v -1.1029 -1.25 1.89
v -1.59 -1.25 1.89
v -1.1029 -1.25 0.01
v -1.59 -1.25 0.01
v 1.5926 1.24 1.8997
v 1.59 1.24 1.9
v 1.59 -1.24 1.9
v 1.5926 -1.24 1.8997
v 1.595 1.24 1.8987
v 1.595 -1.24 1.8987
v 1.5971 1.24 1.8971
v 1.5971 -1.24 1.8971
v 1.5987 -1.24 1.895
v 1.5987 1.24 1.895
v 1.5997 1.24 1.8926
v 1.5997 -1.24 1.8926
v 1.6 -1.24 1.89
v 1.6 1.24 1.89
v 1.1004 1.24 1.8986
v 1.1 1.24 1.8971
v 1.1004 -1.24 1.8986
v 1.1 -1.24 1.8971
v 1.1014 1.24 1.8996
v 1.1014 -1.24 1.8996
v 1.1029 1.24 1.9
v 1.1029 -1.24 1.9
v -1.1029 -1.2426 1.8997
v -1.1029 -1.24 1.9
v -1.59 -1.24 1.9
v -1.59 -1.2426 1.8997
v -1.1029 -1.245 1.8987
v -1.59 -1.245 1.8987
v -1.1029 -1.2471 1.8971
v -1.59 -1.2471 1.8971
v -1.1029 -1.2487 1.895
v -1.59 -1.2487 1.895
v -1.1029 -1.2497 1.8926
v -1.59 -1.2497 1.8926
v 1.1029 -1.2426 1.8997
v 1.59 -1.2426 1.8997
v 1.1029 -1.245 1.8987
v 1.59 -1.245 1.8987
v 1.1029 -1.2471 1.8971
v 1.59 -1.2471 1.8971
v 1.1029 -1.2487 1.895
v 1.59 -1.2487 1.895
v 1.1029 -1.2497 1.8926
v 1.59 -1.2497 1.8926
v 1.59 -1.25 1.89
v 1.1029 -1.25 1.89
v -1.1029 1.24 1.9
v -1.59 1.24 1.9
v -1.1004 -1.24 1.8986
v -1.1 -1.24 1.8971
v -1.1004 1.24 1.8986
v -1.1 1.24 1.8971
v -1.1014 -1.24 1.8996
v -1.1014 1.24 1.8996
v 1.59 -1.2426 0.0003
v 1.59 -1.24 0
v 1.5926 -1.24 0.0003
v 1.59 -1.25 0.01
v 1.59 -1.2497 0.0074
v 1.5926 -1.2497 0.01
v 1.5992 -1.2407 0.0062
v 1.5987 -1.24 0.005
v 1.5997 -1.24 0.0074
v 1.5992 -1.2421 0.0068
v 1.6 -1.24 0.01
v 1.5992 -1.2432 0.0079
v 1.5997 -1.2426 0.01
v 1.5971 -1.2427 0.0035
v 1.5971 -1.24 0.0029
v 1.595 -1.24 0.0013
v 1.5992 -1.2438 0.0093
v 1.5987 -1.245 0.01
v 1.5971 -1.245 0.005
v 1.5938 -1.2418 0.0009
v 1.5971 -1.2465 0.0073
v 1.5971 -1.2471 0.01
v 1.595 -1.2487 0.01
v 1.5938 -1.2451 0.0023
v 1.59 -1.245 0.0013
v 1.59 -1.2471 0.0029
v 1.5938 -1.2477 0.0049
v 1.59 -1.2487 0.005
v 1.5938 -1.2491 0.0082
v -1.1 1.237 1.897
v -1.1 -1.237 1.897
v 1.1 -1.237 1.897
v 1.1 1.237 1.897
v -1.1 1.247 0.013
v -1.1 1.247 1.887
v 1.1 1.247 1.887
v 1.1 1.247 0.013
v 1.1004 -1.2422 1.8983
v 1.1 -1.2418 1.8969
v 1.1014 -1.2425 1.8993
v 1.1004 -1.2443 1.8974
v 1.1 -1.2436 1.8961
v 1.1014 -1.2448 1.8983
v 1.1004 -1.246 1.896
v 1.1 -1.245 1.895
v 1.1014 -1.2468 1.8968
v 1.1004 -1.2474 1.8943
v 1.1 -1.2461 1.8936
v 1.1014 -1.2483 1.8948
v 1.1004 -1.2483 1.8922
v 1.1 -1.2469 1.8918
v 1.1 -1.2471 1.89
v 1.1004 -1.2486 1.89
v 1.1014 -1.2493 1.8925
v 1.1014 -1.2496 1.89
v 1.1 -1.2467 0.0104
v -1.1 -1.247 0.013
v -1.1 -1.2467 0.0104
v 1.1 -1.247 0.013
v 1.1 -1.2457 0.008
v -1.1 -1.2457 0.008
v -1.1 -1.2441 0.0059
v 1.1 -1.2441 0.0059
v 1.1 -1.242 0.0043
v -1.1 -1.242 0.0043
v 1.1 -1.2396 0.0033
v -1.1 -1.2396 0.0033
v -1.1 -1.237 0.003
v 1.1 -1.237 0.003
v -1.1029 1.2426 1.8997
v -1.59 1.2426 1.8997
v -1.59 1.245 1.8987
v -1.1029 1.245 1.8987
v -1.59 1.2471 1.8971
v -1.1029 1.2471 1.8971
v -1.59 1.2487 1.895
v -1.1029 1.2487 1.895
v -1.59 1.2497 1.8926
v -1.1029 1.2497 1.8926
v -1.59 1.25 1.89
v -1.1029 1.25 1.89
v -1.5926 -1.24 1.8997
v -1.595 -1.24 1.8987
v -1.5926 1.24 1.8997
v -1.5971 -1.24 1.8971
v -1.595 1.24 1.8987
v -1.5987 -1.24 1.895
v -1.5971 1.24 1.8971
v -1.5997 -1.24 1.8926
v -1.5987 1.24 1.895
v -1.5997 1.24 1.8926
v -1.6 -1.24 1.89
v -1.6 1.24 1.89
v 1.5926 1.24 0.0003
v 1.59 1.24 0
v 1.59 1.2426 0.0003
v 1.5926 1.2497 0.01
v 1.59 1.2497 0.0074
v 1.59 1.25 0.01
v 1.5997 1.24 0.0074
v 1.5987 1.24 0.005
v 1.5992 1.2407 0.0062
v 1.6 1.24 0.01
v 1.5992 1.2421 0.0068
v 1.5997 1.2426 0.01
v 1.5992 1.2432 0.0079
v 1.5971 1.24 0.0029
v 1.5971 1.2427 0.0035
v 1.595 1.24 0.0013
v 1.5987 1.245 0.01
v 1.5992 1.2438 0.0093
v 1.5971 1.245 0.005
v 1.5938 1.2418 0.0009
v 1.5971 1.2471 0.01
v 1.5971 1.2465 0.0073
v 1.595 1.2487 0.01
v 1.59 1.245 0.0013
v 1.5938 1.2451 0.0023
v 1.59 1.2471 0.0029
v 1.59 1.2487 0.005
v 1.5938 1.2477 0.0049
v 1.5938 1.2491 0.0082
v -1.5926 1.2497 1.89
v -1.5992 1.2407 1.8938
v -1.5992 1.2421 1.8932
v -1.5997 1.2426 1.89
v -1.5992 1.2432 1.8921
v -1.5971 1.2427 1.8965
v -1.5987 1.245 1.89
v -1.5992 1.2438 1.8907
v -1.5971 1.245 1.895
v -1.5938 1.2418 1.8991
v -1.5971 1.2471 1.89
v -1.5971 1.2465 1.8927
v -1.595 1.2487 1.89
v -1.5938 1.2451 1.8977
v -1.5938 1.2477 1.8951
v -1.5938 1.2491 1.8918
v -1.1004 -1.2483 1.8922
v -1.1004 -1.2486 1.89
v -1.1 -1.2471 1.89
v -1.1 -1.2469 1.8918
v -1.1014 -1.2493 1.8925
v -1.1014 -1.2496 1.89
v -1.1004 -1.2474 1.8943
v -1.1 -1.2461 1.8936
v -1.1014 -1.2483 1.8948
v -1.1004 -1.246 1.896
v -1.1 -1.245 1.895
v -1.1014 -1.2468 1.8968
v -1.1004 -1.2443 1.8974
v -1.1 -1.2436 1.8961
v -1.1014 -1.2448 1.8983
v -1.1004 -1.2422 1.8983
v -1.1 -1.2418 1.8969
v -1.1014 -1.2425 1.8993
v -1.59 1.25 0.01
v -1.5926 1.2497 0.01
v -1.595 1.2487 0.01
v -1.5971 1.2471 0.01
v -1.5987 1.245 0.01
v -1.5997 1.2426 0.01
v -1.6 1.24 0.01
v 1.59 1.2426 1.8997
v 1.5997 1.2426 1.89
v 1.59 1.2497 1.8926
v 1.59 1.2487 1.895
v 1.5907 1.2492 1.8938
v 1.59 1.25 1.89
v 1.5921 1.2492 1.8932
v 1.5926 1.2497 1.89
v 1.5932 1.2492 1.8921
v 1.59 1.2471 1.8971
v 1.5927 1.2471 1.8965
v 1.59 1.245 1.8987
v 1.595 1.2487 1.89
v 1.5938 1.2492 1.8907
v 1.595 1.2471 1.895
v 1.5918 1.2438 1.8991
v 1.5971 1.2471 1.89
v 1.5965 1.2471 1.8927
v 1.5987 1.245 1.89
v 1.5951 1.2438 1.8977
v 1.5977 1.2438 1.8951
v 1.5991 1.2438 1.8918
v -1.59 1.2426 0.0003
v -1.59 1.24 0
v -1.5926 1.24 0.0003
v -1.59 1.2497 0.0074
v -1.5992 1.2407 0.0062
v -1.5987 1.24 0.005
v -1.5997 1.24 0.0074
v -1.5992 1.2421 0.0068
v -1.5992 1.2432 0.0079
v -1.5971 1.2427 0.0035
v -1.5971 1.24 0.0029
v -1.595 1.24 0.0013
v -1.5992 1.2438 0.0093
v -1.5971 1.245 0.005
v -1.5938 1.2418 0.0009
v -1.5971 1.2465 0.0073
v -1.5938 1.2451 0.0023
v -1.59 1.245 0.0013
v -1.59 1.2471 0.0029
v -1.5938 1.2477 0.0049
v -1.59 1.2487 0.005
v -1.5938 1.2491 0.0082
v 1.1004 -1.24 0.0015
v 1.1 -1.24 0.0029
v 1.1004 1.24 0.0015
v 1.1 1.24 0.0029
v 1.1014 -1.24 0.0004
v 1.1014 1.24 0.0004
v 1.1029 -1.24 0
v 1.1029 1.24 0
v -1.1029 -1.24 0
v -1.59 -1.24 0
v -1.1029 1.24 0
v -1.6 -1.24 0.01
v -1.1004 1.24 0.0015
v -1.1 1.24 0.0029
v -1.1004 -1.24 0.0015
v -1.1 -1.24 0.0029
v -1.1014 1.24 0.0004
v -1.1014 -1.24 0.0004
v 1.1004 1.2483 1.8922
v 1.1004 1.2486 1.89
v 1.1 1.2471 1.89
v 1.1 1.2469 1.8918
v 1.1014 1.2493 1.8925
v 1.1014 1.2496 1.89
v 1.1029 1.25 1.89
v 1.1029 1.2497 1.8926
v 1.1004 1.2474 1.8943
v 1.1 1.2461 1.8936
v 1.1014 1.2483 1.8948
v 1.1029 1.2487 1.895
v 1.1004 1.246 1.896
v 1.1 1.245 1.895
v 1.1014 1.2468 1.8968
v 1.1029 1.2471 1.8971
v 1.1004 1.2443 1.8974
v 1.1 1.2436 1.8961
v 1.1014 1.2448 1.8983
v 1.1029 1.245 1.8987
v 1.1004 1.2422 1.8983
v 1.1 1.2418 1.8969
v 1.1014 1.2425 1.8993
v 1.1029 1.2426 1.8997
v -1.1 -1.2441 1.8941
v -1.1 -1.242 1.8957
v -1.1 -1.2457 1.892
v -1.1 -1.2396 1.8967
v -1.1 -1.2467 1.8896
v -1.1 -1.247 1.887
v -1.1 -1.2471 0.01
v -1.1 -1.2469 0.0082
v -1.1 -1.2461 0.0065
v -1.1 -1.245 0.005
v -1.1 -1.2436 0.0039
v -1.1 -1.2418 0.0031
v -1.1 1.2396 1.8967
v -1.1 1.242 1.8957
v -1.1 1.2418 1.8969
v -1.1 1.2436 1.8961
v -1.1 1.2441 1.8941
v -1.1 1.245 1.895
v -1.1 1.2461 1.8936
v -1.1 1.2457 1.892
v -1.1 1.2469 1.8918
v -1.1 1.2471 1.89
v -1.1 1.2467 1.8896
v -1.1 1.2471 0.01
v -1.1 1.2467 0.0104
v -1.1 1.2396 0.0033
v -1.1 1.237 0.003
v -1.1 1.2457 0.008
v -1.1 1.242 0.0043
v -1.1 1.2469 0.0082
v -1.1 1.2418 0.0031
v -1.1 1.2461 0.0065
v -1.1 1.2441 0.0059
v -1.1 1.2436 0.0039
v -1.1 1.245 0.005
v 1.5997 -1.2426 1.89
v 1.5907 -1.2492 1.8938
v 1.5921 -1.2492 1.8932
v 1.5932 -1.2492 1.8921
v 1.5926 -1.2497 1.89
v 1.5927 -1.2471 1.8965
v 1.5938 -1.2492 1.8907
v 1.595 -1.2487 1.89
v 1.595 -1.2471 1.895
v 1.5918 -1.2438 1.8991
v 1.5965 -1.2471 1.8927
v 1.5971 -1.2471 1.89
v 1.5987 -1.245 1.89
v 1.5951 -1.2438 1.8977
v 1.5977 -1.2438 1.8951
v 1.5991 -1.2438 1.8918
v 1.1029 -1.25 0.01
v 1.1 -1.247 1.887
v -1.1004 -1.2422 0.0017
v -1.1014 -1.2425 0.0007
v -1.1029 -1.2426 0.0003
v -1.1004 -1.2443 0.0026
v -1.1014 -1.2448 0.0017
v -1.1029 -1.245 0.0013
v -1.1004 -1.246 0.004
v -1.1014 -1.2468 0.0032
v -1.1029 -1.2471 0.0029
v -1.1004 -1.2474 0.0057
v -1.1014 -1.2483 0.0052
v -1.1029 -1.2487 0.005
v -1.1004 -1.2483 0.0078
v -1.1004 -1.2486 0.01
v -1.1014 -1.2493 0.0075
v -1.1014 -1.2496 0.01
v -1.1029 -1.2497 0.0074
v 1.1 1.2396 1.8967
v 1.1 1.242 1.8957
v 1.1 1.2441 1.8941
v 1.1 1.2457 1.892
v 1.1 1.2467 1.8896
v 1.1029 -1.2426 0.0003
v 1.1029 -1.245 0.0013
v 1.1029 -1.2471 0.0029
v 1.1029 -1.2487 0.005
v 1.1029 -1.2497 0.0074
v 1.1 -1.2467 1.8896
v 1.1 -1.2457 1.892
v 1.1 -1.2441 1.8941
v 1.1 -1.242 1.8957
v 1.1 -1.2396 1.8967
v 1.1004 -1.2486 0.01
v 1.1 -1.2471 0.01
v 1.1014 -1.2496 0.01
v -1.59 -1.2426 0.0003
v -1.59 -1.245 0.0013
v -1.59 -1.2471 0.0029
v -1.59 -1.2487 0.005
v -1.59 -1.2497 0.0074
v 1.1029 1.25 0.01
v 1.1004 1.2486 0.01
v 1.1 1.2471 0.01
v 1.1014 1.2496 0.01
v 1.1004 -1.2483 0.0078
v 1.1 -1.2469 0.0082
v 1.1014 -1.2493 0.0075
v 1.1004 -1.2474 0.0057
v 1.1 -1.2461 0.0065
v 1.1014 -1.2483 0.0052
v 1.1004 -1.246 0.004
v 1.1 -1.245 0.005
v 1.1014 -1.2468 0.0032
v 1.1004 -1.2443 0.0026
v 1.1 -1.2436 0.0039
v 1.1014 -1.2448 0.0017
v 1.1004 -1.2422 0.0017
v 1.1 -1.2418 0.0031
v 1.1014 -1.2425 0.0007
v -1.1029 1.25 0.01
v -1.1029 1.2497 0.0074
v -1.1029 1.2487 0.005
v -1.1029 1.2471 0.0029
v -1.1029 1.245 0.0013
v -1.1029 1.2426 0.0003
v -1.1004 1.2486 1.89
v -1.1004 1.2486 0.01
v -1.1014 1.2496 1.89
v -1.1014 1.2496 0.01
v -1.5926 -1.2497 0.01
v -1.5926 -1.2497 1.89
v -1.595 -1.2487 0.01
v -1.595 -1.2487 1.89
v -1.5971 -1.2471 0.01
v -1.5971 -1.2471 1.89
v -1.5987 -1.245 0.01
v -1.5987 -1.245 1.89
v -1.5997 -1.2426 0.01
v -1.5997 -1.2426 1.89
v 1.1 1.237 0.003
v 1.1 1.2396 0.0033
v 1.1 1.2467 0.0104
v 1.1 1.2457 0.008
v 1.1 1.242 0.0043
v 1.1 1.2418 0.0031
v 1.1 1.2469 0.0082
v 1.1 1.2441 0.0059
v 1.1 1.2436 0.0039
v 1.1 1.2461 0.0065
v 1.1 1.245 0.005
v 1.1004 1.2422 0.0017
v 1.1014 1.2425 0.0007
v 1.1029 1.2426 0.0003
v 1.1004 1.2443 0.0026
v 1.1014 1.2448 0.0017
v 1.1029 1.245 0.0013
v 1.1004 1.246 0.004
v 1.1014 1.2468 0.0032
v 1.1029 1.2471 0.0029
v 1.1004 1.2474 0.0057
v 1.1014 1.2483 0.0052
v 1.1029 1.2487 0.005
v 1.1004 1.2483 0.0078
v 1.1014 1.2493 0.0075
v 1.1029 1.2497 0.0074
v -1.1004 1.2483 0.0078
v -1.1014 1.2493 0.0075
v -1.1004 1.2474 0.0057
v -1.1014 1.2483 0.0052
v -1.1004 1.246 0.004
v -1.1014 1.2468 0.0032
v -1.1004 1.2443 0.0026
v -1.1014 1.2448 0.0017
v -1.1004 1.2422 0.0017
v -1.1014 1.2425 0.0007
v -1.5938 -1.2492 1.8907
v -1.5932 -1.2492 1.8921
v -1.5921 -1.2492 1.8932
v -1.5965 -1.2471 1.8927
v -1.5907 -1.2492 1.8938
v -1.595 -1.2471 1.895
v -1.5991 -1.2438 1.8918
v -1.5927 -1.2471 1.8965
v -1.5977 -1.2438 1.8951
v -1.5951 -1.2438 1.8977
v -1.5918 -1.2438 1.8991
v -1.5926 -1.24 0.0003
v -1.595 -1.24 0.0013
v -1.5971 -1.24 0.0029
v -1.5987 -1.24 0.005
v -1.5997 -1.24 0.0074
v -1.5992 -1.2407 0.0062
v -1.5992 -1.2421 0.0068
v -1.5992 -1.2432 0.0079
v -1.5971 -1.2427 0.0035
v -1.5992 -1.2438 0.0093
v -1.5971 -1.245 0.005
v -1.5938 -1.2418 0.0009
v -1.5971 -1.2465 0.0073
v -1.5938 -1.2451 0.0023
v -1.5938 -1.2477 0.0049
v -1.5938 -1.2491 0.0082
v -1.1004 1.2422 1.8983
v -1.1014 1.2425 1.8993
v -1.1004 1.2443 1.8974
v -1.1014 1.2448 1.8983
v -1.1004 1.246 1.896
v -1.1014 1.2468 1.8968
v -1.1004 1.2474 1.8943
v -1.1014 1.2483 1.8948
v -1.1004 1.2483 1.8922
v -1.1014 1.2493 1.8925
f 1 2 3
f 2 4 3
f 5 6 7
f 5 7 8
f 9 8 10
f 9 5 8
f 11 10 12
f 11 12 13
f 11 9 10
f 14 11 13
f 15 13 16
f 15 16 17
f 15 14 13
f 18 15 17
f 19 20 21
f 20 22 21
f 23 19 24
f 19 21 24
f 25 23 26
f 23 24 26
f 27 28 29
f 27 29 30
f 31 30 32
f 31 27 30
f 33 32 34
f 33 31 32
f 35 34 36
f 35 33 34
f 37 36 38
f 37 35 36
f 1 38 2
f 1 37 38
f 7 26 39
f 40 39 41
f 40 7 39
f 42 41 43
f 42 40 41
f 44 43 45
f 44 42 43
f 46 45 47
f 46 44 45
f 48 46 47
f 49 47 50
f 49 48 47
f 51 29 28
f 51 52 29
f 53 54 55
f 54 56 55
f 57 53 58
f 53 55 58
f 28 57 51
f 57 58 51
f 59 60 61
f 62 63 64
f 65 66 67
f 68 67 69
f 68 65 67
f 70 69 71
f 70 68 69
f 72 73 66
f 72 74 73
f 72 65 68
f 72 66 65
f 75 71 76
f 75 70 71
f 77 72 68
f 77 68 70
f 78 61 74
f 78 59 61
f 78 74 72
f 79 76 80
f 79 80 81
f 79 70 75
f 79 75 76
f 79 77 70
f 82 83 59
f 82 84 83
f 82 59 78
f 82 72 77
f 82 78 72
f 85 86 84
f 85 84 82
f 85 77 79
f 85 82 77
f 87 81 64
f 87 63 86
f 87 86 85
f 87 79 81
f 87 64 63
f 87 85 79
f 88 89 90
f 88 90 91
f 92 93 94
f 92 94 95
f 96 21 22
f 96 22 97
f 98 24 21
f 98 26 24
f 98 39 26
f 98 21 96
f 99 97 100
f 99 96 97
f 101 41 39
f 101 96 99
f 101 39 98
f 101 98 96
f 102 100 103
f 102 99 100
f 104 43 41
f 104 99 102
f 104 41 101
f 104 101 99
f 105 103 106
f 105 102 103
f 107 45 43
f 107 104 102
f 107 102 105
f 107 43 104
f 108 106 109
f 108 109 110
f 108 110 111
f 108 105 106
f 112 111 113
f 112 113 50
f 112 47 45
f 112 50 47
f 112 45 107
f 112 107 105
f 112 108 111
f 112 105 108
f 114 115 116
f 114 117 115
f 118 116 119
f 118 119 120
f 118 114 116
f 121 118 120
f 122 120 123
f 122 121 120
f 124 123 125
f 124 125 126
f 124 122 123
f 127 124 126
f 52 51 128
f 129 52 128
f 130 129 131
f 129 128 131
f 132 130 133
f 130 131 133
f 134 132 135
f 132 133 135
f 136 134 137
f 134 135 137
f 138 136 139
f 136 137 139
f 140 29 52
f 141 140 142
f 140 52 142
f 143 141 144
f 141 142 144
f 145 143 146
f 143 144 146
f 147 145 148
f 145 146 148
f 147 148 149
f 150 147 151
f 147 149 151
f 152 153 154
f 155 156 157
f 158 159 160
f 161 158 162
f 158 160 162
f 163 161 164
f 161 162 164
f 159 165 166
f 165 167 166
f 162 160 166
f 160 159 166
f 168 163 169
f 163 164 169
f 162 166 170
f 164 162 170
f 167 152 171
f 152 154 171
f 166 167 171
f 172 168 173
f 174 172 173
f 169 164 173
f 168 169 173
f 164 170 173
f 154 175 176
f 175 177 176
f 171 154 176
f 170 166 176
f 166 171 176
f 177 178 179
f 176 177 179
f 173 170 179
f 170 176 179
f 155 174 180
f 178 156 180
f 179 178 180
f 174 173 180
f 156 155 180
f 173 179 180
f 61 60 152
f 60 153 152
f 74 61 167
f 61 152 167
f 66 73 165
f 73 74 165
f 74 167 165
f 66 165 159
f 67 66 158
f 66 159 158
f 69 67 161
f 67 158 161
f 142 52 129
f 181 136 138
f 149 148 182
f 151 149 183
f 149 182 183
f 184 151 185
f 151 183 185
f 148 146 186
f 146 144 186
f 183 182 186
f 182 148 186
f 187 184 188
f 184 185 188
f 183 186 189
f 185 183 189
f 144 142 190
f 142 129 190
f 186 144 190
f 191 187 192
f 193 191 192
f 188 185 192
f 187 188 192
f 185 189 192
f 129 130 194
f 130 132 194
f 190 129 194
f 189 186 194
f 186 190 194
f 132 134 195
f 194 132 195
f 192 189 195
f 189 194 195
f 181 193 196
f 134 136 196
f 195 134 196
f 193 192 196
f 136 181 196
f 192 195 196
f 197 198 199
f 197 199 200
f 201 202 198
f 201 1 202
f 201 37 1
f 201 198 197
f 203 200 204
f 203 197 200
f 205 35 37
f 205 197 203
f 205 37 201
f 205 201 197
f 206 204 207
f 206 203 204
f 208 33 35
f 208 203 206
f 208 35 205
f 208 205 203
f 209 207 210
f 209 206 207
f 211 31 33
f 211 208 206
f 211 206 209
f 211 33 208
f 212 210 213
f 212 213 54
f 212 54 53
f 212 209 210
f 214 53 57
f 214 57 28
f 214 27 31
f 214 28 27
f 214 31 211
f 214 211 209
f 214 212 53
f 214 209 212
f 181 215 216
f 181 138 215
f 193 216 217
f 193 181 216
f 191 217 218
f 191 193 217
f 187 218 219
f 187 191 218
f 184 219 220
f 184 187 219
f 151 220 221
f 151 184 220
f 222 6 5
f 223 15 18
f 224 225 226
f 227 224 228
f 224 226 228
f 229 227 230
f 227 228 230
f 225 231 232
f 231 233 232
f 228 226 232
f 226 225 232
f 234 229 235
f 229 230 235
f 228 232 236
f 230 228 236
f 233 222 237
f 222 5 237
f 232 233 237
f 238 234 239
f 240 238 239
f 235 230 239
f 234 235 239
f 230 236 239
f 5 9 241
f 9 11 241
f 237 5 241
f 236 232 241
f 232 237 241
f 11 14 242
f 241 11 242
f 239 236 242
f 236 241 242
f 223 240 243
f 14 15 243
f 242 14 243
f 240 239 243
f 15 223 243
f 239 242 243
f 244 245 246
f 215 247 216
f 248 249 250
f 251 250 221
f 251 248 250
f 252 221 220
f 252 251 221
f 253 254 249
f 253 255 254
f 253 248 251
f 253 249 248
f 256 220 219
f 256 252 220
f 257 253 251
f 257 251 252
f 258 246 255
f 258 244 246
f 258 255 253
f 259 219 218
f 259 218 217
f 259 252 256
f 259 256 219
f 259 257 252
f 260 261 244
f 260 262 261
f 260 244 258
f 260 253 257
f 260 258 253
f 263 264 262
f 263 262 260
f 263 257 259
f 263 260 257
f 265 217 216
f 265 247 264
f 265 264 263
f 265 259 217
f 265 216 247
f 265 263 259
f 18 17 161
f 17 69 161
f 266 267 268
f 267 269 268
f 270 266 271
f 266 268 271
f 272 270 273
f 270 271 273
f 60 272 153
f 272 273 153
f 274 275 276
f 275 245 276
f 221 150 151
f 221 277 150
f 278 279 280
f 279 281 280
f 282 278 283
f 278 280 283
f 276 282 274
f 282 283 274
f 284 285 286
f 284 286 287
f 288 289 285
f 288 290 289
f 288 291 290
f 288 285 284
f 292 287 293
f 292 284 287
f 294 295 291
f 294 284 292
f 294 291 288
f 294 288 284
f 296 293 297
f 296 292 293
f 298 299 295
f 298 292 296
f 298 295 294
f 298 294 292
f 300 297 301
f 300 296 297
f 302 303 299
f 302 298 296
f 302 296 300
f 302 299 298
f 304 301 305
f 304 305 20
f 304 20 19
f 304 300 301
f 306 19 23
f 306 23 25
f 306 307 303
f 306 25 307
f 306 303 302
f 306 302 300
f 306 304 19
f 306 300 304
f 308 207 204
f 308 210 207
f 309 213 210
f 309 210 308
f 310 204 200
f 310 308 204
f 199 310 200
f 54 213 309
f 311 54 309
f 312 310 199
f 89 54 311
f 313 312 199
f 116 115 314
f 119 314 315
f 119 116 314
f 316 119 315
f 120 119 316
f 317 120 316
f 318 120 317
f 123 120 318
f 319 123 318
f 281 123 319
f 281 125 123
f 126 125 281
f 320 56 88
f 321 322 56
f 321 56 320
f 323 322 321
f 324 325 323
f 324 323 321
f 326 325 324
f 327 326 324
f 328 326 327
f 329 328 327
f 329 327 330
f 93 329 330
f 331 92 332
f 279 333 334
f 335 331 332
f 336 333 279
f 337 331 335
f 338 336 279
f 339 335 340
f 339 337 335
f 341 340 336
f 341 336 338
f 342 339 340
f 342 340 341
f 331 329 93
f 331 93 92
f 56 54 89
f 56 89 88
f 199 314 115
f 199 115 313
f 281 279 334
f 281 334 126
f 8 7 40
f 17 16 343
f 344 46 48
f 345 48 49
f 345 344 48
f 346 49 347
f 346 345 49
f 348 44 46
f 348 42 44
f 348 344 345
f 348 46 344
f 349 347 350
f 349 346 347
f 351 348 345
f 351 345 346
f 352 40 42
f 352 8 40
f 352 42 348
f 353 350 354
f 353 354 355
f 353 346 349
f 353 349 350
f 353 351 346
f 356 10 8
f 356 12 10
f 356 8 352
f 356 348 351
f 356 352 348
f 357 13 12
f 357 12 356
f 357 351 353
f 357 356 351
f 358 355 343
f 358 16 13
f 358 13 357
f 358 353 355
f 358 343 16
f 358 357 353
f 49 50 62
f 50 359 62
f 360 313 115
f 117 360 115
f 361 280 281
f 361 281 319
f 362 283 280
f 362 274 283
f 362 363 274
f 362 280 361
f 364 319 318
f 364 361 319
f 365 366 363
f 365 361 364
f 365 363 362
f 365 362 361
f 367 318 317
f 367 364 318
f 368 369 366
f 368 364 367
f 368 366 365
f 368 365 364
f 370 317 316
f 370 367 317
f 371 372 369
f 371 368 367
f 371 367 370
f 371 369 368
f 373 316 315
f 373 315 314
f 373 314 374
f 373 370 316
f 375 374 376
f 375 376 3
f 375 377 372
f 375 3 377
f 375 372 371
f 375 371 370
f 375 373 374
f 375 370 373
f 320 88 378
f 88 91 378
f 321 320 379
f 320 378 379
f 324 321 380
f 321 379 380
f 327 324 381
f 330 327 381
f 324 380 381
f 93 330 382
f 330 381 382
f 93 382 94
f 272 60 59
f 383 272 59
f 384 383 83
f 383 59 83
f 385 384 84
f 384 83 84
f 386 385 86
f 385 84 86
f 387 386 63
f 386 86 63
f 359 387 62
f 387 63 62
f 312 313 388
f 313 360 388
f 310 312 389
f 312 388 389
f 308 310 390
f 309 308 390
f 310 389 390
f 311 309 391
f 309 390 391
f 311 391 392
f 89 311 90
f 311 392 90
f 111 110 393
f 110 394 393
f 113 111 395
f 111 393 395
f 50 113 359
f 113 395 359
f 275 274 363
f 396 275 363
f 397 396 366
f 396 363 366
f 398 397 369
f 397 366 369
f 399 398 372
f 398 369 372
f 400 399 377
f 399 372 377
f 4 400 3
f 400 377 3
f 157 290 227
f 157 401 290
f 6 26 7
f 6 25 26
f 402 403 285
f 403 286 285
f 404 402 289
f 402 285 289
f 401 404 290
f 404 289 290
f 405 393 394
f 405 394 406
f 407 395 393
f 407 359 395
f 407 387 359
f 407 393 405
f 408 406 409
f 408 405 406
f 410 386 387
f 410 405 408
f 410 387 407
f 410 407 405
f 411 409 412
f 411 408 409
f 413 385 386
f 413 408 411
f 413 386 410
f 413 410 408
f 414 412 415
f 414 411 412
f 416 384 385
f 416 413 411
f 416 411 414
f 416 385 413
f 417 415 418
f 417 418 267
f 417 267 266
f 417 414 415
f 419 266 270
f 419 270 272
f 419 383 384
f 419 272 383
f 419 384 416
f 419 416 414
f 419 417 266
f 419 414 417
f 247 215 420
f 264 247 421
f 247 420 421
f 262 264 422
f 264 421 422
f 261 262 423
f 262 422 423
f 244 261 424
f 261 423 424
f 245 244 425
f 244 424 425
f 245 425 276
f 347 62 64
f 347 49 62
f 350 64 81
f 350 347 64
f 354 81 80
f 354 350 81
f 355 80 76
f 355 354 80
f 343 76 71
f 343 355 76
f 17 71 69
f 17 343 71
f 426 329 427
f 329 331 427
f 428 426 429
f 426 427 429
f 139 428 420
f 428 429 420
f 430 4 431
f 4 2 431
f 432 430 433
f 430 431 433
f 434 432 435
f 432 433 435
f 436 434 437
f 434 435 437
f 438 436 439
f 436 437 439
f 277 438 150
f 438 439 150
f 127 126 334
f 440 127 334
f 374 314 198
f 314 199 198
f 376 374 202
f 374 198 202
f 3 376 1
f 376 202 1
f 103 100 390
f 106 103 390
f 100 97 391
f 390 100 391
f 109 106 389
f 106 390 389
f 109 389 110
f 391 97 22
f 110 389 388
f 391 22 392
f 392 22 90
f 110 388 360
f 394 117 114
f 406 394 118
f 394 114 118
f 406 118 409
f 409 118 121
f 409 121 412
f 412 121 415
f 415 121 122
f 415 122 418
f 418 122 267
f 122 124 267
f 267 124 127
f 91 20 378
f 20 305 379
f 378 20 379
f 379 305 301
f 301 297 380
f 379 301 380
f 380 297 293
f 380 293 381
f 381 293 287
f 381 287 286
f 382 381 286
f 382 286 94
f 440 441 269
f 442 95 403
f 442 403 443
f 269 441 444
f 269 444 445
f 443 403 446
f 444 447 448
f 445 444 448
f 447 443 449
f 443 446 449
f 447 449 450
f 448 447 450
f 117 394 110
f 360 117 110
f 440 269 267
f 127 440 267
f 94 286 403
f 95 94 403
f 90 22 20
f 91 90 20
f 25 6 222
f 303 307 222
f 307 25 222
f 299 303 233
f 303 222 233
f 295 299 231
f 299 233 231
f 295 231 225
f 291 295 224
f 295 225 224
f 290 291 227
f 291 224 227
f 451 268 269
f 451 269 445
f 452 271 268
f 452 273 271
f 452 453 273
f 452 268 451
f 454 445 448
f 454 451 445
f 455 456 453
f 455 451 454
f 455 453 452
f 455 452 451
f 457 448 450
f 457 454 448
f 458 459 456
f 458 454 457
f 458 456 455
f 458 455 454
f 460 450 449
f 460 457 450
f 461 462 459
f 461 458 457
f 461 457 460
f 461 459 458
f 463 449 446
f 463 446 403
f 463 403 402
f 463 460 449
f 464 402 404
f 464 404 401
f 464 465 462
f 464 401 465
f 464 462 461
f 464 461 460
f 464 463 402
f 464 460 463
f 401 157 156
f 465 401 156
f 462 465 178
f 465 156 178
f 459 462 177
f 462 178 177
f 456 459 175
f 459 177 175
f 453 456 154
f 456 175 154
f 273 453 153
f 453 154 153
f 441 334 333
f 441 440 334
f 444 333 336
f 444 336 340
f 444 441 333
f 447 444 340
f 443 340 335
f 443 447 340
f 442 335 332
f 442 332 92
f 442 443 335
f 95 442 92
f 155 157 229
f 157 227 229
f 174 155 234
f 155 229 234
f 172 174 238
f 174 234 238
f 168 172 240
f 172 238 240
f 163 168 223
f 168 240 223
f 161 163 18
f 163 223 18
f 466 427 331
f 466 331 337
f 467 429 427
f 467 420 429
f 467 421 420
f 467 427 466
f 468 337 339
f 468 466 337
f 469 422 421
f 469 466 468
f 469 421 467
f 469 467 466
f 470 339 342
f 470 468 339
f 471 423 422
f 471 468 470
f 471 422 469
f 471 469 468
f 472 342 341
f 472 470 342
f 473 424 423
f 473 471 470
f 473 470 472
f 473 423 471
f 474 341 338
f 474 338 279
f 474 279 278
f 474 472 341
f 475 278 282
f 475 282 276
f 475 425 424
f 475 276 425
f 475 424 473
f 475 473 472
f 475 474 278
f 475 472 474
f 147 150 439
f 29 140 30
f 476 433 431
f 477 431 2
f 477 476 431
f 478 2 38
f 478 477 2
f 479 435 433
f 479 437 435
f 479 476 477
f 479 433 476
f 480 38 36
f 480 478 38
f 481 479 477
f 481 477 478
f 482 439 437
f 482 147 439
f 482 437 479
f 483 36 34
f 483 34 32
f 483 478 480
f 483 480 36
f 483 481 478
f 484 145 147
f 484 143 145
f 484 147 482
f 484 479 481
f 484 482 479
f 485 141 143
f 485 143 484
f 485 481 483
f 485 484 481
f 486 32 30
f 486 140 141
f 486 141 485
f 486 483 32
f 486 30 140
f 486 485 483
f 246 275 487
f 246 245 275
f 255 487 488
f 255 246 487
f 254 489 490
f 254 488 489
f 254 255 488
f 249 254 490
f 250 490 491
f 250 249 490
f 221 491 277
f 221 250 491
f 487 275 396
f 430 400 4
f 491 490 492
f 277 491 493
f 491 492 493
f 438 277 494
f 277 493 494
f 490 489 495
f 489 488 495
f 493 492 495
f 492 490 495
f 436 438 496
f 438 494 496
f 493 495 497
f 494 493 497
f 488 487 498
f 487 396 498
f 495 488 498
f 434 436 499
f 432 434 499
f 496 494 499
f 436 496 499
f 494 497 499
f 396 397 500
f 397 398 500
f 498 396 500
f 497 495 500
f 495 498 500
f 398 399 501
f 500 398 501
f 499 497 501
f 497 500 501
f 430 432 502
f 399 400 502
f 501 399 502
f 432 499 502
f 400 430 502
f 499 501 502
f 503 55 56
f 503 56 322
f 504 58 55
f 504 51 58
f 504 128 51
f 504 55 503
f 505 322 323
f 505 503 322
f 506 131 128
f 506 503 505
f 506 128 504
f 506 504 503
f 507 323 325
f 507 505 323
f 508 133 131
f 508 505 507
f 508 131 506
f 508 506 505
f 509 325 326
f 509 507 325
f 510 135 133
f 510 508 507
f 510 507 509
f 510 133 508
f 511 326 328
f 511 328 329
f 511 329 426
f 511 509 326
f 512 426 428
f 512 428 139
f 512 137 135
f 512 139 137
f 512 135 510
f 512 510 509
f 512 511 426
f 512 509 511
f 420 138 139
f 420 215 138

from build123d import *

# Parameters (mm, degrees)
SKETCH1_W                           = 3.2
SKETCH1_H                           = 2.5
ALL_BODY_DEPTH                      = 1.9
CUT_OUT_THE_BODY_FOR_PIN_DEPTH      = 1.1
CUT_OUT_THE_BODY_FOR_PIN_DEPTH_BACK = 1.1
SKETCH2_OUTSIDE_W                   = 4.796
SKETCH2_OUTSIDE_H                   = 5.396
SKETCH2_OUTSIDE_W_2                 = 1.894
SKETCH2_OUTSIDE_H_2                 = 2.494
BODY_FILLET_R                       = 0.01
PIN_FILLET_A_R                      = 0.01
PIN_FILLET_B_R                      = 0.003


with BuildPart() as part:
    # Sketch1 → All body (new body)
    with BuildSketch(Plane.XY):
        Rectangle(SKETCH1_W, SKETCH1_H)
    extrude(amount=ALL_BODY_DEPTH)

    # Sketch2 outside → Cut out the body for pin (cut, two sides: drawn at the far end of the back side and taken through both)
    with BuildSketch(Plane(origin=(0, 0, 0), x_dir=(0, 0, -1), z_dir=(1, 0, 0)).offset(-CUT_OUT_THE_BODY_FOR_PIN_DEPTH_BACK)):
        with Locations((-0.95, 0)):
            Rectangle(SKETCH2_OUTSIDE_W, SKETCH2_OUTSIDE_H)
        with Locations((-0.95, 0)):
            Rectangle(SKETCH2_OUTSIDE_W_2, SKETCH2_OUTSIDE_H_2, mode=Mode.SUBTRACT)
    extrude(amount=CUT_OUT_THE_BODY_FOR_PIN_DEPTH + CUT_OUT_THE_BODY_FOR_PIN_DEPTH_BACK, mode=Mode.SUBTRACT)

    # Body fillet
    body_fillet_edges = [part.edges().sort_by_distance(p)[0] for p in [
        (0, 1.247, 0.003),
        (0, 1.247, 1.897),
        (0, -1.247, 1.897),
        (0, -1.247, 0.003),
    ]]
    fillet(body_fillet_edges, radius=BODY_FILLET_R)

    # Pin fillet a
    pin_fillet_a_edges = [part.edges().sort_by_distance(p)[0] for p in [
        (1.6, 0, 1.9),
        (-1.35, 1.25, 0),
        (1.35, -1.25, 0),
        (1.35, -1.25, 1.9),
        (-1.35, 1.25, 1.9),
        (1.35, 1.25, 1.9),
        (-1.6, 0, 1.9),
        (1.35, 1.25, 0),
        (1.6, 0, 0),
        (-1.35, -1.25, 0),
        (-1.6, 0, 0),
        (-1.6, 1.25, 0.95),
        (1.6, 1.25, 0.95),
        (1.6, -1.25, 0.95),
        (-1.6, -1.25, 0.95),
        (-1.35, -1.25, 1.9),
    ]]
    fillet(pin_fillet_a_edges, radius=PIN_FILLET_A_R)

    # Pin fillet b
    pin_fillet_b_edges = [part.edges().sort_by_distance(p)[0] for p in [
        (1.1, -1.25, 0.95),
        (1.1, 0, 1.9),
        (1.1, 1.25, 0.95),
        (1.1, 0, 0),
        (-1.1, 1.25, 0.95),
        (-1.1, 0, 1.9),
        (-1.1, -1.25, 0.95),
        (-1.1, 0, 0),
        (1.1, 1.247071068, 0.002928932),
        (1.1, -1.247071068, 0.002928932),
        (1.1, -1.247071068, 1.897071068),
        (1.1, 1.247071068, 1.897071068),
        (-1.1, -1.247071068, 1.897071068),
        (-1.1, 1.247071068, 1.897071068),
        (-1.1, -1.247071068, 0.002928932),
        (-1.1, 1.247071068, 0.002928932),
    ]]
    fillet(pin_fillet_b_edges, radius=PIN_FILLET_B_R - 0.0001)  # a hair under: the kernel refuses the full size


solid = part.part
